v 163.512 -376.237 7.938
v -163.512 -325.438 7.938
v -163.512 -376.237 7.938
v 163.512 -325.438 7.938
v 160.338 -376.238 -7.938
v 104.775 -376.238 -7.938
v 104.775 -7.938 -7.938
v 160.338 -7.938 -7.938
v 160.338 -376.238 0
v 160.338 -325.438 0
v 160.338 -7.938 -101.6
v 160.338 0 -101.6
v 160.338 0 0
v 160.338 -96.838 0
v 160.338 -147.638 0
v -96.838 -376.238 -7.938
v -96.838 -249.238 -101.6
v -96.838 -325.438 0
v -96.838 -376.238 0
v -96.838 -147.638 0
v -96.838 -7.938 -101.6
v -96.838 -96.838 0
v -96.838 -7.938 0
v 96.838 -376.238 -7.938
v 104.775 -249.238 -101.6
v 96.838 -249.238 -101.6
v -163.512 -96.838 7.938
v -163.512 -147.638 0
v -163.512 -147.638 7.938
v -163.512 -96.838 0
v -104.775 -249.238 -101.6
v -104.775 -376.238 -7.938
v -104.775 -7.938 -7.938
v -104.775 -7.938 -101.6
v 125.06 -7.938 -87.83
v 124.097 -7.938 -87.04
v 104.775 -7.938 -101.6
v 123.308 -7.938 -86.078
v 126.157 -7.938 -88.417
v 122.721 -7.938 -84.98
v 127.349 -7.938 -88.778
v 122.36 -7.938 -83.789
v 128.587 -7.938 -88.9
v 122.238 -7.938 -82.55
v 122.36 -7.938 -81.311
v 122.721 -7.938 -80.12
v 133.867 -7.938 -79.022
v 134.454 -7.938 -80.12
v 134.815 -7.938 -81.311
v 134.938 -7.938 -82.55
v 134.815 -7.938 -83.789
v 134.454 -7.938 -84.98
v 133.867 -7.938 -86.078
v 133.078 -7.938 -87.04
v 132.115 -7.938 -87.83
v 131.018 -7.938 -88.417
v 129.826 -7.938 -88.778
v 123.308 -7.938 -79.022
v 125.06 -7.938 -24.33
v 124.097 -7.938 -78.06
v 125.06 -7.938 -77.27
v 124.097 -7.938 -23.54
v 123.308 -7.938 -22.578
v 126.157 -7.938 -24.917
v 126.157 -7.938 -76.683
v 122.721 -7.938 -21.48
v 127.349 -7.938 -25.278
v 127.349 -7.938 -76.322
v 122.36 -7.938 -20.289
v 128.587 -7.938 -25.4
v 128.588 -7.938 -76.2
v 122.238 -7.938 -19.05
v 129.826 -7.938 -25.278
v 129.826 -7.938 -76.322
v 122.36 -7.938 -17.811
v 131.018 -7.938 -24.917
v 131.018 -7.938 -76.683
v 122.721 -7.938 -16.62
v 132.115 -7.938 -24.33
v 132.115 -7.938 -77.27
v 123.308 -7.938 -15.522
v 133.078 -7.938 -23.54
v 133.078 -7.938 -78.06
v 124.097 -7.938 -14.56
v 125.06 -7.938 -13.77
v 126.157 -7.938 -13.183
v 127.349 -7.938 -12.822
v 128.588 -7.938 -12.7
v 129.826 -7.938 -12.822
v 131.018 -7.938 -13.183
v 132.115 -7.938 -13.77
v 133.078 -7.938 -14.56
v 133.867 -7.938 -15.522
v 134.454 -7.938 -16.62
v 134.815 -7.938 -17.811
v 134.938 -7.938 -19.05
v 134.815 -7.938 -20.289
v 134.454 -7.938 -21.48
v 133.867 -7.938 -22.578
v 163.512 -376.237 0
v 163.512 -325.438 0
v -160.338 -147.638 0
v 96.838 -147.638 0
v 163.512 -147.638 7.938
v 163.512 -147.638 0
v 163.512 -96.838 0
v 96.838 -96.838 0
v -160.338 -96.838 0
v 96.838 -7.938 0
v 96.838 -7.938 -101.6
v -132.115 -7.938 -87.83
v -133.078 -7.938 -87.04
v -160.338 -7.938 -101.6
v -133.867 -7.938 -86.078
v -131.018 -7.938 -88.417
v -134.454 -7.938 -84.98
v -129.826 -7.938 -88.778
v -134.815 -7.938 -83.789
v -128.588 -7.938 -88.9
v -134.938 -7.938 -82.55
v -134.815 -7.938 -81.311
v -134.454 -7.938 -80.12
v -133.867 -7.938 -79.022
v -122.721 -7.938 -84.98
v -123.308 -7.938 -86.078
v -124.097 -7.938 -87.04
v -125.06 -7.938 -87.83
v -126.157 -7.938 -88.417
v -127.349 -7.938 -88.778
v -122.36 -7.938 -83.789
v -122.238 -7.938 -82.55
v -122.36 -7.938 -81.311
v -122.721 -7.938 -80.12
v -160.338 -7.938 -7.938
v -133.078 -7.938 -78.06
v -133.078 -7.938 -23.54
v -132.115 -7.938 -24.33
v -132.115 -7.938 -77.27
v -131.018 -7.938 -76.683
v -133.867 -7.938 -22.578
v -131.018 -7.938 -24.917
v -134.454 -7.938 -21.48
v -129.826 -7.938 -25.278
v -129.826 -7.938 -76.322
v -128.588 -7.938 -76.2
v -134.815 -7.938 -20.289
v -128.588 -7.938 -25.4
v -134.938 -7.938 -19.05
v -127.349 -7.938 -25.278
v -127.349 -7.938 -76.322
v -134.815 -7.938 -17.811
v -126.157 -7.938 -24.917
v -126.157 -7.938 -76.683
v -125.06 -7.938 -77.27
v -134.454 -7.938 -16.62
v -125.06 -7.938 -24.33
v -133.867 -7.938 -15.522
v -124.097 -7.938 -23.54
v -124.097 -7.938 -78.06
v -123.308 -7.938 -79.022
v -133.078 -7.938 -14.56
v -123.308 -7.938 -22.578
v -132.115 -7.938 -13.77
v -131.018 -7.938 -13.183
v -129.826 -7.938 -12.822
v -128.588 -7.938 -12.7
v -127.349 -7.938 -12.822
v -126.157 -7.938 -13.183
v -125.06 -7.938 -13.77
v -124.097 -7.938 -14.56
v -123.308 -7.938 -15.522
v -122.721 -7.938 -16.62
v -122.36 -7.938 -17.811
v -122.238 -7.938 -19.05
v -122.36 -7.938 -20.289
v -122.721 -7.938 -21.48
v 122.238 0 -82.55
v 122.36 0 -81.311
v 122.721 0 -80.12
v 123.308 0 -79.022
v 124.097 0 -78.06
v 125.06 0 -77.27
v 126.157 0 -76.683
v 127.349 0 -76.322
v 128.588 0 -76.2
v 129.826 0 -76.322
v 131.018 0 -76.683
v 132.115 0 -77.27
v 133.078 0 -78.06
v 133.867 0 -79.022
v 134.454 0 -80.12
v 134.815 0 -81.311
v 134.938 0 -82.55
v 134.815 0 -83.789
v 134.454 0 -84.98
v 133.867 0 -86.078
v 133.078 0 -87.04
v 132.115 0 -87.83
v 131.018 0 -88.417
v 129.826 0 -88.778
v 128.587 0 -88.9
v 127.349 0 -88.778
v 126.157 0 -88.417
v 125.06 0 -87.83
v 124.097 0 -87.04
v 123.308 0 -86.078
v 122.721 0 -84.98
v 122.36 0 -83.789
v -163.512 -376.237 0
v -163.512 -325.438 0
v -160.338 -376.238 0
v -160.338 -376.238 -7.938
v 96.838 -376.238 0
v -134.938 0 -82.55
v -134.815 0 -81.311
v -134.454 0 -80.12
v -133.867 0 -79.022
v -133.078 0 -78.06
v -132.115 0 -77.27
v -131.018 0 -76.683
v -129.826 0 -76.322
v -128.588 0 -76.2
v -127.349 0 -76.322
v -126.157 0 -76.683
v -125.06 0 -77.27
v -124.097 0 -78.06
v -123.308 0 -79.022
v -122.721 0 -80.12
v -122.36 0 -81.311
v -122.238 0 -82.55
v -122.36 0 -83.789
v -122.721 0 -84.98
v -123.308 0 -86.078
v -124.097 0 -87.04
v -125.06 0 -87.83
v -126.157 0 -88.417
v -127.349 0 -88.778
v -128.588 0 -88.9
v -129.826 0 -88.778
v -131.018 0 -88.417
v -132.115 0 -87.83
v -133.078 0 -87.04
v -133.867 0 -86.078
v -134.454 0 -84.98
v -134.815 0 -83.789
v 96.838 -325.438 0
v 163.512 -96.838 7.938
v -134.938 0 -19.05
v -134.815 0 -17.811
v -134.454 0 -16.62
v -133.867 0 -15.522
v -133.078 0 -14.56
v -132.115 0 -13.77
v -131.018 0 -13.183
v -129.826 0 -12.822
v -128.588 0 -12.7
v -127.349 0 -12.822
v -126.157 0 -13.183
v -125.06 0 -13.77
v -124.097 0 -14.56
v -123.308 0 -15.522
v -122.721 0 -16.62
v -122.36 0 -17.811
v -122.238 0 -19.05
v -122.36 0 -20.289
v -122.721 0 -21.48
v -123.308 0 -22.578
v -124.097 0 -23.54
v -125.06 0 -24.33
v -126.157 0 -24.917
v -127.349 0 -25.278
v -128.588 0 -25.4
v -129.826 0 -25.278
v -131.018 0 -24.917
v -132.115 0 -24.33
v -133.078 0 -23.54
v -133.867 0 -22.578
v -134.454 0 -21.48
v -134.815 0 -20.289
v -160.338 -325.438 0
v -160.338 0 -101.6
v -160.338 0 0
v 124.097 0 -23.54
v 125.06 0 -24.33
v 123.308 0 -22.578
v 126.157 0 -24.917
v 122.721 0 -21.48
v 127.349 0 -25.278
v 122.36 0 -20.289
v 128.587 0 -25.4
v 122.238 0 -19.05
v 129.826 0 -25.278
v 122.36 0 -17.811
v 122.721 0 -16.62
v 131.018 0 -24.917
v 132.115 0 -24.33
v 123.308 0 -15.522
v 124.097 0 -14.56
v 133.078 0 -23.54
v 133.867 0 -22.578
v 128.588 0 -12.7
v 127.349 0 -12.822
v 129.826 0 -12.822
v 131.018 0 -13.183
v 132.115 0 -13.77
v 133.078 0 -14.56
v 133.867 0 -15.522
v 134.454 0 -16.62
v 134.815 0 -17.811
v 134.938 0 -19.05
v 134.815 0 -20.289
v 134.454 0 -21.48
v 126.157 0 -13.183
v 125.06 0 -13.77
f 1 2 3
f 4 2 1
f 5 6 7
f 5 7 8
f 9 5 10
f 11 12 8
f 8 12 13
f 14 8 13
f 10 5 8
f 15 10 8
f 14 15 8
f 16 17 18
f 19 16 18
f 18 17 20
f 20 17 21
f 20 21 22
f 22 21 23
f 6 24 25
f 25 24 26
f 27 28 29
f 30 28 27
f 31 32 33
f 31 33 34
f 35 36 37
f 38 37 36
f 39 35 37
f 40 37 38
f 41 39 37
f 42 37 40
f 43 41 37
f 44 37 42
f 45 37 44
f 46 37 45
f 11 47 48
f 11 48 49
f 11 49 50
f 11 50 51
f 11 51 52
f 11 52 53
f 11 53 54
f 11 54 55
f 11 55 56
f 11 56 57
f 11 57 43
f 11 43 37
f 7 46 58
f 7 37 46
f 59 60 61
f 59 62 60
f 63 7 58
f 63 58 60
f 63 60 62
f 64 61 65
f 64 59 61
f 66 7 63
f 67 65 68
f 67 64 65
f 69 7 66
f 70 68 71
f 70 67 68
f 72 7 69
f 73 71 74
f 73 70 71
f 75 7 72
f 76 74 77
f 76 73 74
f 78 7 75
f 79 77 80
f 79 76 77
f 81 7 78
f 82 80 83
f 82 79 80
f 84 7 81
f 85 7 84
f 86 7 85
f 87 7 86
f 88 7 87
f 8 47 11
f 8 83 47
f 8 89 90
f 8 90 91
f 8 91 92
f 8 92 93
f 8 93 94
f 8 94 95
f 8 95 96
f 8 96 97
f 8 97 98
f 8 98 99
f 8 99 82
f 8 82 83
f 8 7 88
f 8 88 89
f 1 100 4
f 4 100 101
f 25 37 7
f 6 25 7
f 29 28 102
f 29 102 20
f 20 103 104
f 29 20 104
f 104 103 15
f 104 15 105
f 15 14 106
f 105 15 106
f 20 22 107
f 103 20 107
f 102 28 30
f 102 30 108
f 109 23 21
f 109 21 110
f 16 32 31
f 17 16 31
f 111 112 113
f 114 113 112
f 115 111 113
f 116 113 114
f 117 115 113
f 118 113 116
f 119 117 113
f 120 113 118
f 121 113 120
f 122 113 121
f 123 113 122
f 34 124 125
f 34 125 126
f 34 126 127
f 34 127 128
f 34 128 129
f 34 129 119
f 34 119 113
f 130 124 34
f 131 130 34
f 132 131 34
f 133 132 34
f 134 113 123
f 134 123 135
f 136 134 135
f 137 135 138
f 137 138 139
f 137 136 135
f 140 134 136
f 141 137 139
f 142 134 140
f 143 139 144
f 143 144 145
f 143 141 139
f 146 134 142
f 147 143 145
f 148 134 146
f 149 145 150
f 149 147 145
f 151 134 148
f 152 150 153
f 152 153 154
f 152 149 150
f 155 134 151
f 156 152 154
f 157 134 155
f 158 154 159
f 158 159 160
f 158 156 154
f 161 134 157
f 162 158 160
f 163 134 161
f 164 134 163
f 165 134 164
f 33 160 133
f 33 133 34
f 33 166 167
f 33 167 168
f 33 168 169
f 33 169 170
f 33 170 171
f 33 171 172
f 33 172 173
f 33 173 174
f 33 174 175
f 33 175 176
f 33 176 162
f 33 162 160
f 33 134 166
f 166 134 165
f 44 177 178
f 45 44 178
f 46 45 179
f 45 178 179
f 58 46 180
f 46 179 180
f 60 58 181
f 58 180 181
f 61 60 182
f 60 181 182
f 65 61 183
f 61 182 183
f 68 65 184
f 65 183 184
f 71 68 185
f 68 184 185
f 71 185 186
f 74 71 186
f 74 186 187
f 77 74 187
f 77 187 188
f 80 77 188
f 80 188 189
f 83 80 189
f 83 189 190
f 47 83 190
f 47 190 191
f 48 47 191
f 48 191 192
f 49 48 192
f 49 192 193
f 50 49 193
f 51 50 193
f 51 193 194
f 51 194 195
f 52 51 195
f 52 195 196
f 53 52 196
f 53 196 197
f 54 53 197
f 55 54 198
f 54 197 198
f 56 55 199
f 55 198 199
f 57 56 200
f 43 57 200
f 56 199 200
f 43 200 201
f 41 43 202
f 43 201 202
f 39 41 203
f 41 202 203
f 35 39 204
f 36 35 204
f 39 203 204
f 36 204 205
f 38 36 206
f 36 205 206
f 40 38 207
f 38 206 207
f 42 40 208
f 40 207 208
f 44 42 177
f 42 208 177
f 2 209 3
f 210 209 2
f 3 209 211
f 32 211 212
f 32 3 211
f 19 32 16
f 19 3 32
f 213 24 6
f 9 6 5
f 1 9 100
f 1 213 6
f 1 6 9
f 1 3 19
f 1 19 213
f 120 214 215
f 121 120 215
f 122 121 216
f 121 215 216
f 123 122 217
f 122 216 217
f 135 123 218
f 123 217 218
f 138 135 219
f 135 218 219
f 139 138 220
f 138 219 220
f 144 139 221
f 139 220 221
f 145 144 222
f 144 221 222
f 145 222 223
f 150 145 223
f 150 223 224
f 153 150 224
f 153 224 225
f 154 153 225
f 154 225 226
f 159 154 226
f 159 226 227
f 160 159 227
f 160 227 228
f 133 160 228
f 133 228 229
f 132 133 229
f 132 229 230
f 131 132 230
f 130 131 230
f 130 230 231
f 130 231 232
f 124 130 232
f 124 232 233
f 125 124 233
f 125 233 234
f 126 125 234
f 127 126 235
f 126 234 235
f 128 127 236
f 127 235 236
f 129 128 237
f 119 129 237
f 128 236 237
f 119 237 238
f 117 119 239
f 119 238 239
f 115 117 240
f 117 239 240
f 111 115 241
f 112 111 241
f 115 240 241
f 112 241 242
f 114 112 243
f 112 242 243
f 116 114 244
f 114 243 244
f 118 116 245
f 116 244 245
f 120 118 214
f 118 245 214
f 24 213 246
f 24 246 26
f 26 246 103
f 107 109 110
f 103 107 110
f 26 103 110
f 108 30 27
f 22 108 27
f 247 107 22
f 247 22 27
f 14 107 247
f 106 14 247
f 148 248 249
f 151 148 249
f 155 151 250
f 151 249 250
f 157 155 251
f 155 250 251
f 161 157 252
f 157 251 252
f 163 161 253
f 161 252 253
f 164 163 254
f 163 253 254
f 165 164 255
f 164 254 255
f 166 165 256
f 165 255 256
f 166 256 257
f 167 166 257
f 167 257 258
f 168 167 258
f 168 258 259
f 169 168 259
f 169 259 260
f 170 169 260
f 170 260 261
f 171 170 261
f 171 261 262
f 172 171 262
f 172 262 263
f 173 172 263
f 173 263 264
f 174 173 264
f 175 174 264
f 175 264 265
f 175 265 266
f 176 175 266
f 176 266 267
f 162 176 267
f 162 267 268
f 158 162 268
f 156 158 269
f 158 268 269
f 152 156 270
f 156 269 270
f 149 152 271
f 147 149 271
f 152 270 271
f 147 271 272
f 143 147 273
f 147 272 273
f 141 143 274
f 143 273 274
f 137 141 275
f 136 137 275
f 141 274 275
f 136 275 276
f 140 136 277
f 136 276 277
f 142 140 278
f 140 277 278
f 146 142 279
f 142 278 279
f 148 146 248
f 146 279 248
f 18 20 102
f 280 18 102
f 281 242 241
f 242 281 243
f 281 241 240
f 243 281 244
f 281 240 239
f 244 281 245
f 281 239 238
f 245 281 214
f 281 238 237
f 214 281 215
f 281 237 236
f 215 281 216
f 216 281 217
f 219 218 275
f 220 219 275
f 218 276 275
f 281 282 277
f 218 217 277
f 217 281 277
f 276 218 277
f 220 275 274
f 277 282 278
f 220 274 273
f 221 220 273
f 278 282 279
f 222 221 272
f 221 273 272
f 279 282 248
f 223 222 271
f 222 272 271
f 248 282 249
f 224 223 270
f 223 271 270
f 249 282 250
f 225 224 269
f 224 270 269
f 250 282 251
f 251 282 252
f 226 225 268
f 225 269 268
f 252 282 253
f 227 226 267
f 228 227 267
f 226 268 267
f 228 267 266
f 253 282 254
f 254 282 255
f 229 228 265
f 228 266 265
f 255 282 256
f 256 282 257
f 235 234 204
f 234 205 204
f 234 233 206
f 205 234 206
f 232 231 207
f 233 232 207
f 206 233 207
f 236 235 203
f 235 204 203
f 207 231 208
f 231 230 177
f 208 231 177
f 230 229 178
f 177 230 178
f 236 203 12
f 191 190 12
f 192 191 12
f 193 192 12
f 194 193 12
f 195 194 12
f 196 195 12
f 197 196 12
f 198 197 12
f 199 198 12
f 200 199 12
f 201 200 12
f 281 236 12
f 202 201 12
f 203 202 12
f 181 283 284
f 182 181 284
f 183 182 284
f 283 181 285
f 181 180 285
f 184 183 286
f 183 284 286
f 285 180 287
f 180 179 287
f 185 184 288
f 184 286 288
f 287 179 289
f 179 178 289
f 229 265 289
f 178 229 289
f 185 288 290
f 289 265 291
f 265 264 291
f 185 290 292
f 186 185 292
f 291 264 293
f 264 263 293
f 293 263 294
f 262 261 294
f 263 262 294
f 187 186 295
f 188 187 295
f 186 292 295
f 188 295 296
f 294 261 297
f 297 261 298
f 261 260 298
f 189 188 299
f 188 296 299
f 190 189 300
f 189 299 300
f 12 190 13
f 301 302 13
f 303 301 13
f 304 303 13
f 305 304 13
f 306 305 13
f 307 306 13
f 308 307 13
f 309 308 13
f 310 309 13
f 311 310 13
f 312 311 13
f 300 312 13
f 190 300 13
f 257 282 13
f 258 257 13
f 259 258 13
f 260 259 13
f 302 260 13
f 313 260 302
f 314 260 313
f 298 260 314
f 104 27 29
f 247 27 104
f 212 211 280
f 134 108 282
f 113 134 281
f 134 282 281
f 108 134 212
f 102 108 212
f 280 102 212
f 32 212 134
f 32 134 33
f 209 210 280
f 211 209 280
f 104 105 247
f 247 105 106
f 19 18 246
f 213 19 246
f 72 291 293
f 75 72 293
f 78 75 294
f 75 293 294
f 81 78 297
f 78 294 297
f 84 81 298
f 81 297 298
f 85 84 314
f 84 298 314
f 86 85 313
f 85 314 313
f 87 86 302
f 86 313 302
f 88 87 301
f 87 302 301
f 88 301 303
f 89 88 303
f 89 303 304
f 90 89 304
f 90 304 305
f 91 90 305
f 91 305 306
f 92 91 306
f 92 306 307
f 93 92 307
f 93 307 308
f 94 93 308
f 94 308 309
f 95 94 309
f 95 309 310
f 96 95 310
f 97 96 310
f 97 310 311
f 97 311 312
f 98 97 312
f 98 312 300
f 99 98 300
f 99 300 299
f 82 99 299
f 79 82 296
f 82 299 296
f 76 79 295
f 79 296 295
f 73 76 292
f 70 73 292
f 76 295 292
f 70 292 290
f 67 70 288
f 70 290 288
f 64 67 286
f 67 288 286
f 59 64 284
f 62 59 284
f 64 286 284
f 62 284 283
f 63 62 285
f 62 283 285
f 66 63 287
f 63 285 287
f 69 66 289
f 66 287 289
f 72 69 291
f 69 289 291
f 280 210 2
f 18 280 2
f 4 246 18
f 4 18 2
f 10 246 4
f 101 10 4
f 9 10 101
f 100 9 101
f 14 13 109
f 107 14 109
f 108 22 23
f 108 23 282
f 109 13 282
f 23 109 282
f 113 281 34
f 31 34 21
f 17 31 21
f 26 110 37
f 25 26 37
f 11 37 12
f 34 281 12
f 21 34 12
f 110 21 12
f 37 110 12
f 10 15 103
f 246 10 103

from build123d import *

# Parameters (mm, degrees)
F0_W     = 320.675
F0_H     = 101.6
F1_DEPTH = 7.9375
F3_D     = 12.7
F5_DEPTH = 368.3
F7_DEPTH = 265.1135
F8_W     = 327.025
F8_H     = 50.8
F9_DEPTH = 7.9375


with BuildPart() as f1:
    # F0 (on Front) → F1 (new body)
    with BuildSketch(Plane.XZ):
        with Locations((0, -50.8)):
            Rectangle(F0_W, F0_H)
    extrude(amount=F1_DEPTH)

    # F3 (through all)
    with Locations(Plane.XZ.offset(7.9375)):
        with Locations((-128.5875, -19.05), (128.5875, -19.05), (128.5875, -82.55), (-128.5875, -82.55)):
            Hole(F3_D / 2)

    # F4 (on face) → F5 (join)
    with BuildSketch(Plane.XZ.offset(7.9375)):
        Polygon((-96.8375, 0), (-160.3375, 0), (-160.3375, -7.9375), (-104.775, -7.9375), (-104.775, -101.6), (-96.8375, -101.6), align=None)
        Polygon((160.3375, 0), (96.8375, 0), (96.8375, -101.6), (104.775, -101.6), (104.775, -7.9375), (160.3375, -7.9375), align=None)
    extrude(amount=F5_DEPTH)

    # F6 (on face) → F7 (cut, through all)
    with BuildSketch(Plane(origin=(-104.775, 0, 0), x_dir=(0, -1, 0), z_dir=(-1, 0, 0))):
        Polygon((376.2375, -101.6), (376.2375, -7.9375), (249.2375, -101.6), align=None)
    extrude(amount=-F7_DEPTH, mode=Mode.SUBTRACT)

    # F8 (on face) → F9 (join)
    with BuildSketch(Plane.XY):
        with Locations((0, -122.2375)):
            Rectangle(F8_W, F8_H)
        with Locations((0, -350.8375)):
            Rectangle(F8_W, F8_H)
    extrude(amount=F9_DEPTH)


solid = f1.part
